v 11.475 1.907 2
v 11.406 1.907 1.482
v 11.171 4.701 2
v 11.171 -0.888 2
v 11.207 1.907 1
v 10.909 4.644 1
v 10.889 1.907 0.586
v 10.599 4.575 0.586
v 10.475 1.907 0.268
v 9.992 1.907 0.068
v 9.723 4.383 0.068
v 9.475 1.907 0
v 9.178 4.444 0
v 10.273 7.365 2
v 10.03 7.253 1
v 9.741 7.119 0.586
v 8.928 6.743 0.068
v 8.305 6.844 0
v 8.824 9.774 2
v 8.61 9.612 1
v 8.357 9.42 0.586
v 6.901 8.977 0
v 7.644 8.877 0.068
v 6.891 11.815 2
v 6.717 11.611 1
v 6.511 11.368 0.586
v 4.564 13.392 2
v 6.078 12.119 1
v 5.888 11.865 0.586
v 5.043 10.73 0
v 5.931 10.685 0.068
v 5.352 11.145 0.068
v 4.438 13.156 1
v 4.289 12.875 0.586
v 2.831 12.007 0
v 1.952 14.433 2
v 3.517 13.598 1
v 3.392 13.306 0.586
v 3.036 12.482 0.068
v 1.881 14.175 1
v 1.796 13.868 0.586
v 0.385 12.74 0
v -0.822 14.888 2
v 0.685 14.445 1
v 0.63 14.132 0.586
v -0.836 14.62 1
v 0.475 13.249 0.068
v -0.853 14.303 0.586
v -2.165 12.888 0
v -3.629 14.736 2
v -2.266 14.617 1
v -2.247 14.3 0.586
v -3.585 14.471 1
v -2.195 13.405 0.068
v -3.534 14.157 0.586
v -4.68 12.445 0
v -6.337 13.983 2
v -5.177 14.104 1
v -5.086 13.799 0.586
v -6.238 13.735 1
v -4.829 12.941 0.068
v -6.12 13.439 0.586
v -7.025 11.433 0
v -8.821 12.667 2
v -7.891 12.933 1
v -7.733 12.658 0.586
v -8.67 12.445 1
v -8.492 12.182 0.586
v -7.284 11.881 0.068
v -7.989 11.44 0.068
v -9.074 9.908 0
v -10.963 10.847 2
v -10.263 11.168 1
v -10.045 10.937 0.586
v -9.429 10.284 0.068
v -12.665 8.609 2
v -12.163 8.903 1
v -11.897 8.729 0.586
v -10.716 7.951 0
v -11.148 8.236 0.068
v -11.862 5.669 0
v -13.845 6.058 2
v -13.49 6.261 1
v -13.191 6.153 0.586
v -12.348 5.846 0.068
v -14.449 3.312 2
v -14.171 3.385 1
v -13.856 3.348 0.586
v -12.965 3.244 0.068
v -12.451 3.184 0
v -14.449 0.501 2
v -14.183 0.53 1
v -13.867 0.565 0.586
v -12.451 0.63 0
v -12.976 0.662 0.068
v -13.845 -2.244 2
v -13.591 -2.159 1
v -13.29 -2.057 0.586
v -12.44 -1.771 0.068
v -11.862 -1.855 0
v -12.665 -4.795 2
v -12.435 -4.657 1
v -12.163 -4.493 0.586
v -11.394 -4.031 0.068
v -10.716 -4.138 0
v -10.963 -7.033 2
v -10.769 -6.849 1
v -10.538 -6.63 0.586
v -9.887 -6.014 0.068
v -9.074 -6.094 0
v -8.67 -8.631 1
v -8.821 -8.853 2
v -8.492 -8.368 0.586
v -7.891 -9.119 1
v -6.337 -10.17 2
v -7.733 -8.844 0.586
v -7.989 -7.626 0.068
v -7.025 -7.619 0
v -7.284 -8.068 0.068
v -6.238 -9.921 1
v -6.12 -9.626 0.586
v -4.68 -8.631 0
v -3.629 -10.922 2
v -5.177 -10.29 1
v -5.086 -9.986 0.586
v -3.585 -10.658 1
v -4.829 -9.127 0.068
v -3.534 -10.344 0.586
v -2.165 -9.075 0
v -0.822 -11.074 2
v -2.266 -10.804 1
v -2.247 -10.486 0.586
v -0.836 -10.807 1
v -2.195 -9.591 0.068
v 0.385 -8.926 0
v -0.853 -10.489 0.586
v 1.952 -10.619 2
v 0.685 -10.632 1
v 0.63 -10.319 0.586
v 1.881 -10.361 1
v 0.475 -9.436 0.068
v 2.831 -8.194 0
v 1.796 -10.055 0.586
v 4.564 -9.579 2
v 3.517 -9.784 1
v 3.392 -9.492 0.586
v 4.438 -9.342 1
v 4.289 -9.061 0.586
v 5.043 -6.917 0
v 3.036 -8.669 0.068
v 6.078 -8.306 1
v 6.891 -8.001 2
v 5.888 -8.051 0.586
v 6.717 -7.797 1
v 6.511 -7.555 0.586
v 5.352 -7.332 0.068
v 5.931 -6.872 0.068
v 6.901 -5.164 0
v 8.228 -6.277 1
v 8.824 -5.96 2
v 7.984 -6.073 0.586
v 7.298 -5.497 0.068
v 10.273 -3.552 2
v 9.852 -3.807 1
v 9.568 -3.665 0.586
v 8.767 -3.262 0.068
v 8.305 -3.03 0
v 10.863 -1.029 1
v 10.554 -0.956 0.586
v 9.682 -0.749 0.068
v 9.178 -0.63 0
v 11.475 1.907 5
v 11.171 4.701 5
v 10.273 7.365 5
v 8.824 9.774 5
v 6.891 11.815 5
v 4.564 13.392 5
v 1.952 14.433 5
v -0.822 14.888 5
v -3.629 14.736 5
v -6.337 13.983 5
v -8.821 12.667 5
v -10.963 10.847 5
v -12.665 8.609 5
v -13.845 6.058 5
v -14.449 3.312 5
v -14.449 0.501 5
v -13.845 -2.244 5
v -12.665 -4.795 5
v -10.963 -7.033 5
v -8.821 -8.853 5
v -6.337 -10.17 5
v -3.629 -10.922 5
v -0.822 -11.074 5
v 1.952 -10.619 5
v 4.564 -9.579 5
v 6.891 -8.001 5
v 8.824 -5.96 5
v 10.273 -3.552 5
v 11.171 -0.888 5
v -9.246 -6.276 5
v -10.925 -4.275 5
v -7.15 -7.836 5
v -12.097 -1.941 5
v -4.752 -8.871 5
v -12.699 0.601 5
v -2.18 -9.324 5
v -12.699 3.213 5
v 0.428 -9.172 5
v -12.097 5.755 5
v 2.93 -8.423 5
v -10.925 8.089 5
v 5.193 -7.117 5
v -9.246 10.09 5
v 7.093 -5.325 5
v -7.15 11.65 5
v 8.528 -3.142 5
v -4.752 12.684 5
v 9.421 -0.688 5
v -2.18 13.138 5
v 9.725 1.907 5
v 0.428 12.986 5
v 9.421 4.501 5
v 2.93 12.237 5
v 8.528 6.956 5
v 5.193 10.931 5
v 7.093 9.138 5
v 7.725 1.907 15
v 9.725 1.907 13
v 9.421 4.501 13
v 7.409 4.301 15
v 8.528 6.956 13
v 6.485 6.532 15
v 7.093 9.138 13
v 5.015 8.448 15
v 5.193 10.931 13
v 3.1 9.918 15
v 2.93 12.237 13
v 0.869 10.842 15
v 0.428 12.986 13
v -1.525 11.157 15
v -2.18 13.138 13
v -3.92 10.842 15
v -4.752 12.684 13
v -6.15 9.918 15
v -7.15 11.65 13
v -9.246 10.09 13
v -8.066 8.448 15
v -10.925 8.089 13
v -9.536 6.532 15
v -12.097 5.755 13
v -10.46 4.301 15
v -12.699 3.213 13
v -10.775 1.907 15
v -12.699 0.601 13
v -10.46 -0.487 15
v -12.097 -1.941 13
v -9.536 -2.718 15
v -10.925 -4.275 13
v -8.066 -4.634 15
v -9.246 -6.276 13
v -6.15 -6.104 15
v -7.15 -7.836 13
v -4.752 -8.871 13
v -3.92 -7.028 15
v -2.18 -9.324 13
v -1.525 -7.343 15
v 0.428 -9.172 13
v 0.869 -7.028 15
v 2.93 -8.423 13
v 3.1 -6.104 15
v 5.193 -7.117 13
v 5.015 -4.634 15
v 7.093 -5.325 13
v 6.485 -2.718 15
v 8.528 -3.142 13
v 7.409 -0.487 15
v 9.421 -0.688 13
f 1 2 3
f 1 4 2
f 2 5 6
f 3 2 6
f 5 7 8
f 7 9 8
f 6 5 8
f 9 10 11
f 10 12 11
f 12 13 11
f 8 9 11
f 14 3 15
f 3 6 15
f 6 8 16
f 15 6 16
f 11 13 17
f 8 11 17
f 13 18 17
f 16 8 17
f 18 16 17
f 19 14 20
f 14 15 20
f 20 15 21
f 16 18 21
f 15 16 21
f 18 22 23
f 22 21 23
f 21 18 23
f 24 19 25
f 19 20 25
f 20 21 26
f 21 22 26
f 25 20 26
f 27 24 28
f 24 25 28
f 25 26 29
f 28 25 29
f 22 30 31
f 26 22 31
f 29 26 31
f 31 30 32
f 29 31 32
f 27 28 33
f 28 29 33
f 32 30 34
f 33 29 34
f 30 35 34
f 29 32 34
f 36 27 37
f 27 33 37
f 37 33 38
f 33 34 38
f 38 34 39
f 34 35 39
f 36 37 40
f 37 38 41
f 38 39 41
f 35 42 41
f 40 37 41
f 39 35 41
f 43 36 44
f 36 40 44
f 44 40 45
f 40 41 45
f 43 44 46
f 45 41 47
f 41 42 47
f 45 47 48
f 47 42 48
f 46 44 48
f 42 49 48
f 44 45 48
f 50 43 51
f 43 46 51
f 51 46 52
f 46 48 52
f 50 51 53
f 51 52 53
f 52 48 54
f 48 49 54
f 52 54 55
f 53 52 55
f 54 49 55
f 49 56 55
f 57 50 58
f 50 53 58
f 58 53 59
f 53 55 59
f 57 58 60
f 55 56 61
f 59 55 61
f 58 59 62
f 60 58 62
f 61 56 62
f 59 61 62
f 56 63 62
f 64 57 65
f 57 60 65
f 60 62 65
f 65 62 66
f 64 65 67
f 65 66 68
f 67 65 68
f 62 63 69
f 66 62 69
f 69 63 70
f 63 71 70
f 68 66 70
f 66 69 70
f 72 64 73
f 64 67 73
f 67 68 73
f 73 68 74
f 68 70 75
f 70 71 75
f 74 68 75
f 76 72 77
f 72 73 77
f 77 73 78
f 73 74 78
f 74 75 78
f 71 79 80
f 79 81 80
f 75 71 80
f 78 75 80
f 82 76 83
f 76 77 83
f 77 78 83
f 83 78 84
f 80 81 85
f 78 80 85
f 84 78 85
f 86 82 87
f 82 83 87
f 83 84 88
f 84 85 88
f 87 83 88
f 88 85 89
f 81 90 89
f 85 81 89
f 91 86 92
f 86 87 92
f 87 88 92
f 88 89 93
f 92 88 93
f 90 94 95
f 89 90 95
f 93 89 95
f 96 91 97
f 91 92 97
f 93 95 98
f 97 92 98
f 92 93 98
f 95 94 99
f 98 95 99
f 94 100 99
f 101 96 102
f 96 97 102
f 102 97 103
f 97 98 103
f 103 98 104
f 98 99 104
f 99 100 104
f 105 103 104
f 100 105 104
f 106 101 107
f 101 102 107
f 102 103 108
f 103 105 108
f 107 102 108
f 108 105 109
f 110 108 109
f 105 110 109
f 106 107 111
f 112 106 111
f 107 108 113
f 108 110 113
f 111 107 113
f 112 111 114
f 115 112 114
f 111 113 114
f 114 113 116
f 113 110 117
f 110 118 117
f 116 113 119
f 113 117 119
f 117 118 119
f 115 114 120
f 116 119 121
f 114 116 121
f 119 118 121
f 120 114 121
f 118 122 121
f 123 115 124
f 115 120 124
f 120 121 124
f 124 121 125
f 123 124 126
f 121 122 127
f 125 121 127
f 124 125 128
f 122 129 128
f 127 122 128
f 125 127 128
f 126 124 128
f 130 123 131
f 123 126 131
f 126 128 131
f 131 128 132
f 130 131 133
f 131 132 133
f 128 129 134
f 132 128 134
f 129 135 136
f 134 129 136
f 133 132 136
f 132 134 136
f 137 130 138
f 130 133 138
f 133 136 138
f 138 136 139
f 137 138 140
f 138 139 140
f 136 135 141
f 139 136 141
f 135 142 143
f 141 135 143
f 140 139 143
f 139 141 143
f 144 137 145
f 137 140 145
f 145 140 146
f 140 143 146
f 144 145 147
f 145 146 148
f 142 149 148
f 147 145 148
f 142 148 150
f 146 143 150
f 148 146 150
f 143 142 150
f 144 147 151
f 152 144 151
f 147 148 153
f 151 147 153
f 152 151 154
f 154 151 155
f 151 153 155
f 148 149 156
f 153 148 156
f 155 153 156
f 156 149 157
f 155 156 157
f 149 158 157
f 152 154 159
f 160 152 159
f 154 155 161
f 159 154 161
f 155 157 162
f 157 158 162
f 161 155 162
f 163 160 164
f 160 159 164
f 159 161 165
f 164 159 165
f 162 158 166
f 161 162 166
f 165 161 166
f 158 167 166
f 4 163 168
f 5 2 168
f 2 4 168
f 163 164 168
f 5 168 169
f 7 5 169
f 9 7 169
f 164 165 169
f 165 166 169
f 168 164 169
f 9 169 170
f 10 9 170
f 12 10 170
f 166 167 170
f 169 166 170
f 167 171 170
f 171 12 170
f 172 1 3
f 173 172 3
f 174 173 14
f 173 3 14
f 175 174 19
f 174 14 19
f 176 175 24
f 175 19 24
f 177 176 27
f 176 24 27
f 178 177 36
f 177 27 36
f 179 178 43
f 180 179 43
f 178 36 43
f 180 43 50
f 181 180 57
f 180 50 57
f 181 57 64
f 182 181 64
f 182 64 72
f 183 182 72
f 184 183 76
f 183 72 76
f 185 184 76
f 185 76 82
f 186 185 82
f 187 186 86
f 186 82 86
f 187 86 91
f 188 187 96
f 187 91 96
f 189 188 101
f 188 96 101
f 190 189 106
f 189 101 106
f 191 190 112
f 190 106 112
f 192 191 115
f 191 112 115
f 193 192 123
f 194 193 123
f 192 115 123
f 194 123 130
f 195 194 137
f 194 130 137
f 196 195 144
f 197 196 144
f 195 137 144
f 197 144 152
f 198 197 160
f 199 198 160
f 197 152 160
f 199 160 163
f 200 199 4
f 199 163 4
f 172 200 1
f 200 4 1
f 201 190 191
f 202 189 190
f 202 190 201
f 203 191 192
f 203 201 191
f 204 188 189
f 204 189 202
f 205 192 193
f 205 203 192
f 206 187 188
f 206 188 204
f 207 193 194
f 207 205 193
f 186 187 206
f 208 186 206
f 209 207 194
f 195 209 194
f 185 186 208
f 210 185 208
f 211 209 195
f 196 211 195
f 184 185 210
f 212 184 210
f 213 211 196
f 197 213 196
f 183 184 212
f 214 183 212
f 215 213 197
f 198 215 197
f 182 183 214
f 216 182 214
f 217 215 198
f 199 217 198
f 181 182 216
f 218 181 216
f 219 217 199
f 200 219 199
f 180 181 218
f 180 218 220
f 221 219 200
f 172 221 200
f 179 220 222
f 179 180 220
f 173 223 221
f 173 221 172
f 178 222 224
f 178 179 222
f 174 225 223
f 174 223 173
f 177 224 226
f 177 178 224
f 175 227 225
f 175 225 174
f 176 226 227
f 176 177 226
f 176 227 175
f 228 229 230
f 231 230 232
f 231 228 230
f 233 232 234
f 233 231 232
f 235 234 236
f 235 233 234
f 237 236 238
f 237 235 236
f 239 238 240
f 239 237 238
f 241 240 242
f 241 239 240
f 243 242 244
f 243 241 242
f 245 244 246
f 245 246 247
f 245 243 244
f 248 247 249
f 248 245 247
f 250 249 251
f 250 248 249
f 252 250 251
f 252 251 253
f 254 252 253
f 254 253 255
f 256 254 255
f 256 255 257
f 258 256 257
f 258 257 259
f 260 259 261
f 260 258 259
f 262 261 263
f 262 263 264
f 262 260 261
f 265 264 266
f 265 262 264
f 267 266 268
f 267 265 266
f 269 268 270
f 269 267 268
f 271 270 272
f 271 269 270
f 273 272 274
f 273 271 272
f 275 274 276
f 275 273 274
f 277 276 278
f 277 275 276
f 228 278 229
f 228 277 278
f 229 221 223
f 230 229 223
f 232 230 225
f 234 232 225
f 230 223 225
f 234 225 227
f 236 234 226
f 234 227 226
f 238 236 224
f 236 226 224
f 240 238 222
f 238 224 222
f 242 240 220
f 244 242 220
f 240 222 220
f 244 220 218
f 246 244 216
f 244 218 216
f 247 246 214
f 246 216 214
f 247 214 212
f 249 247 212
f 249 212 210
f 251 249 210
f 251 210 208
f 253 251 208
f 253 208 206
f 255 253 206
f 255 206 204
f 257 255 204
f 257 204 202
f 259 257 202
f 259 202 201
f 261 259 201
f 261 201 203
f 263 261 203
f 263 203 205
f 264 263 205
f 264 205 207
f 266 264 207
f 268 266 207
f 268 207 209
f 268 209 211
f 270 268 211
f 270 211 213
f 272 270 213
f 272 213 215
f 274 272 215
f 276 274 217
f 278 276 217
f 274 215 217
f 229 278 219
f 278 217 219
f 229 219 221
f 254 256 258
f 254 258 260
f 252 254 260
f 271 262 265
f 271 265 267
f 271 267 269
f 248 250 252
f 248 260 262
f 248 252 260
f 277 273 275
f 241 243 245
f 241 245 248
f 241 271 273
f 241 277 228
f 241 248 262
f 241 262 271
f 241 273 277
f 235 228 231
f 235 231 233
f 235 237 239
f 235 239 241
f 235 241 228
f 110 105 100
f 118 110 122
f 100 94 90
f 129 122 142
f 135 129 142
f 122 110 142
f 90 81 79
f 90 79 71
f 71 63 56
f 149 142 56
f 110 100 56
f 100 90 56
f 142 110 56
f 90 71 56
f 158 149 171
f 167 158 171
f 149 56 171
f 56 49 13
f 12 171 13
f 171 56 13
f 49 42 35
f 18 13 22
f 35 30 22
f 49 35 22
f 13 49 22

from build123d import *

# Parameters (mm, degrees)
F0_R     = 13
F0_R_2   = 11.25
F1_DEPTH = 5
F2_DEPTH = 15
F3_SIZE  = 2
F4_R     = 2


with BuildPart() as f1:
    # F0 (on Top) → F1 (new body)
    with BuildSketch(Plane.XY):
        with Locations((-1.525424, 1.90678)):
            Circle(F0_R)
        with Locations((-1.525424, 1.90678)):
            Circle(F0_R_2, mode=Mode.SUBTRACT)
    extrude(amount=F1_DEPTH)

    # F0 (on Top) → F2 (join)
    with BuildSketch(Plane.XY):
        with Locations((-1.525424, 1.90678)):
            Circle(F0_R_2)
    extrude(amount=F2_DEPTH)

    # F3
    f3_edges = [f1.edges().sort_by_distance(p)[0] for p in [
        (-12.775424, 1.90678, 15),
    ]]
    chamfer(f3_edges, length=F3_SIZE)

    # F4
    f4_edges = [f1.edges().sort_by_distance(p)[0] for p in [
        (-14.525424, 1.90678, 0),
    ]]
    fillet(f4_edges, radius=F4_R)


solid = f1.part
